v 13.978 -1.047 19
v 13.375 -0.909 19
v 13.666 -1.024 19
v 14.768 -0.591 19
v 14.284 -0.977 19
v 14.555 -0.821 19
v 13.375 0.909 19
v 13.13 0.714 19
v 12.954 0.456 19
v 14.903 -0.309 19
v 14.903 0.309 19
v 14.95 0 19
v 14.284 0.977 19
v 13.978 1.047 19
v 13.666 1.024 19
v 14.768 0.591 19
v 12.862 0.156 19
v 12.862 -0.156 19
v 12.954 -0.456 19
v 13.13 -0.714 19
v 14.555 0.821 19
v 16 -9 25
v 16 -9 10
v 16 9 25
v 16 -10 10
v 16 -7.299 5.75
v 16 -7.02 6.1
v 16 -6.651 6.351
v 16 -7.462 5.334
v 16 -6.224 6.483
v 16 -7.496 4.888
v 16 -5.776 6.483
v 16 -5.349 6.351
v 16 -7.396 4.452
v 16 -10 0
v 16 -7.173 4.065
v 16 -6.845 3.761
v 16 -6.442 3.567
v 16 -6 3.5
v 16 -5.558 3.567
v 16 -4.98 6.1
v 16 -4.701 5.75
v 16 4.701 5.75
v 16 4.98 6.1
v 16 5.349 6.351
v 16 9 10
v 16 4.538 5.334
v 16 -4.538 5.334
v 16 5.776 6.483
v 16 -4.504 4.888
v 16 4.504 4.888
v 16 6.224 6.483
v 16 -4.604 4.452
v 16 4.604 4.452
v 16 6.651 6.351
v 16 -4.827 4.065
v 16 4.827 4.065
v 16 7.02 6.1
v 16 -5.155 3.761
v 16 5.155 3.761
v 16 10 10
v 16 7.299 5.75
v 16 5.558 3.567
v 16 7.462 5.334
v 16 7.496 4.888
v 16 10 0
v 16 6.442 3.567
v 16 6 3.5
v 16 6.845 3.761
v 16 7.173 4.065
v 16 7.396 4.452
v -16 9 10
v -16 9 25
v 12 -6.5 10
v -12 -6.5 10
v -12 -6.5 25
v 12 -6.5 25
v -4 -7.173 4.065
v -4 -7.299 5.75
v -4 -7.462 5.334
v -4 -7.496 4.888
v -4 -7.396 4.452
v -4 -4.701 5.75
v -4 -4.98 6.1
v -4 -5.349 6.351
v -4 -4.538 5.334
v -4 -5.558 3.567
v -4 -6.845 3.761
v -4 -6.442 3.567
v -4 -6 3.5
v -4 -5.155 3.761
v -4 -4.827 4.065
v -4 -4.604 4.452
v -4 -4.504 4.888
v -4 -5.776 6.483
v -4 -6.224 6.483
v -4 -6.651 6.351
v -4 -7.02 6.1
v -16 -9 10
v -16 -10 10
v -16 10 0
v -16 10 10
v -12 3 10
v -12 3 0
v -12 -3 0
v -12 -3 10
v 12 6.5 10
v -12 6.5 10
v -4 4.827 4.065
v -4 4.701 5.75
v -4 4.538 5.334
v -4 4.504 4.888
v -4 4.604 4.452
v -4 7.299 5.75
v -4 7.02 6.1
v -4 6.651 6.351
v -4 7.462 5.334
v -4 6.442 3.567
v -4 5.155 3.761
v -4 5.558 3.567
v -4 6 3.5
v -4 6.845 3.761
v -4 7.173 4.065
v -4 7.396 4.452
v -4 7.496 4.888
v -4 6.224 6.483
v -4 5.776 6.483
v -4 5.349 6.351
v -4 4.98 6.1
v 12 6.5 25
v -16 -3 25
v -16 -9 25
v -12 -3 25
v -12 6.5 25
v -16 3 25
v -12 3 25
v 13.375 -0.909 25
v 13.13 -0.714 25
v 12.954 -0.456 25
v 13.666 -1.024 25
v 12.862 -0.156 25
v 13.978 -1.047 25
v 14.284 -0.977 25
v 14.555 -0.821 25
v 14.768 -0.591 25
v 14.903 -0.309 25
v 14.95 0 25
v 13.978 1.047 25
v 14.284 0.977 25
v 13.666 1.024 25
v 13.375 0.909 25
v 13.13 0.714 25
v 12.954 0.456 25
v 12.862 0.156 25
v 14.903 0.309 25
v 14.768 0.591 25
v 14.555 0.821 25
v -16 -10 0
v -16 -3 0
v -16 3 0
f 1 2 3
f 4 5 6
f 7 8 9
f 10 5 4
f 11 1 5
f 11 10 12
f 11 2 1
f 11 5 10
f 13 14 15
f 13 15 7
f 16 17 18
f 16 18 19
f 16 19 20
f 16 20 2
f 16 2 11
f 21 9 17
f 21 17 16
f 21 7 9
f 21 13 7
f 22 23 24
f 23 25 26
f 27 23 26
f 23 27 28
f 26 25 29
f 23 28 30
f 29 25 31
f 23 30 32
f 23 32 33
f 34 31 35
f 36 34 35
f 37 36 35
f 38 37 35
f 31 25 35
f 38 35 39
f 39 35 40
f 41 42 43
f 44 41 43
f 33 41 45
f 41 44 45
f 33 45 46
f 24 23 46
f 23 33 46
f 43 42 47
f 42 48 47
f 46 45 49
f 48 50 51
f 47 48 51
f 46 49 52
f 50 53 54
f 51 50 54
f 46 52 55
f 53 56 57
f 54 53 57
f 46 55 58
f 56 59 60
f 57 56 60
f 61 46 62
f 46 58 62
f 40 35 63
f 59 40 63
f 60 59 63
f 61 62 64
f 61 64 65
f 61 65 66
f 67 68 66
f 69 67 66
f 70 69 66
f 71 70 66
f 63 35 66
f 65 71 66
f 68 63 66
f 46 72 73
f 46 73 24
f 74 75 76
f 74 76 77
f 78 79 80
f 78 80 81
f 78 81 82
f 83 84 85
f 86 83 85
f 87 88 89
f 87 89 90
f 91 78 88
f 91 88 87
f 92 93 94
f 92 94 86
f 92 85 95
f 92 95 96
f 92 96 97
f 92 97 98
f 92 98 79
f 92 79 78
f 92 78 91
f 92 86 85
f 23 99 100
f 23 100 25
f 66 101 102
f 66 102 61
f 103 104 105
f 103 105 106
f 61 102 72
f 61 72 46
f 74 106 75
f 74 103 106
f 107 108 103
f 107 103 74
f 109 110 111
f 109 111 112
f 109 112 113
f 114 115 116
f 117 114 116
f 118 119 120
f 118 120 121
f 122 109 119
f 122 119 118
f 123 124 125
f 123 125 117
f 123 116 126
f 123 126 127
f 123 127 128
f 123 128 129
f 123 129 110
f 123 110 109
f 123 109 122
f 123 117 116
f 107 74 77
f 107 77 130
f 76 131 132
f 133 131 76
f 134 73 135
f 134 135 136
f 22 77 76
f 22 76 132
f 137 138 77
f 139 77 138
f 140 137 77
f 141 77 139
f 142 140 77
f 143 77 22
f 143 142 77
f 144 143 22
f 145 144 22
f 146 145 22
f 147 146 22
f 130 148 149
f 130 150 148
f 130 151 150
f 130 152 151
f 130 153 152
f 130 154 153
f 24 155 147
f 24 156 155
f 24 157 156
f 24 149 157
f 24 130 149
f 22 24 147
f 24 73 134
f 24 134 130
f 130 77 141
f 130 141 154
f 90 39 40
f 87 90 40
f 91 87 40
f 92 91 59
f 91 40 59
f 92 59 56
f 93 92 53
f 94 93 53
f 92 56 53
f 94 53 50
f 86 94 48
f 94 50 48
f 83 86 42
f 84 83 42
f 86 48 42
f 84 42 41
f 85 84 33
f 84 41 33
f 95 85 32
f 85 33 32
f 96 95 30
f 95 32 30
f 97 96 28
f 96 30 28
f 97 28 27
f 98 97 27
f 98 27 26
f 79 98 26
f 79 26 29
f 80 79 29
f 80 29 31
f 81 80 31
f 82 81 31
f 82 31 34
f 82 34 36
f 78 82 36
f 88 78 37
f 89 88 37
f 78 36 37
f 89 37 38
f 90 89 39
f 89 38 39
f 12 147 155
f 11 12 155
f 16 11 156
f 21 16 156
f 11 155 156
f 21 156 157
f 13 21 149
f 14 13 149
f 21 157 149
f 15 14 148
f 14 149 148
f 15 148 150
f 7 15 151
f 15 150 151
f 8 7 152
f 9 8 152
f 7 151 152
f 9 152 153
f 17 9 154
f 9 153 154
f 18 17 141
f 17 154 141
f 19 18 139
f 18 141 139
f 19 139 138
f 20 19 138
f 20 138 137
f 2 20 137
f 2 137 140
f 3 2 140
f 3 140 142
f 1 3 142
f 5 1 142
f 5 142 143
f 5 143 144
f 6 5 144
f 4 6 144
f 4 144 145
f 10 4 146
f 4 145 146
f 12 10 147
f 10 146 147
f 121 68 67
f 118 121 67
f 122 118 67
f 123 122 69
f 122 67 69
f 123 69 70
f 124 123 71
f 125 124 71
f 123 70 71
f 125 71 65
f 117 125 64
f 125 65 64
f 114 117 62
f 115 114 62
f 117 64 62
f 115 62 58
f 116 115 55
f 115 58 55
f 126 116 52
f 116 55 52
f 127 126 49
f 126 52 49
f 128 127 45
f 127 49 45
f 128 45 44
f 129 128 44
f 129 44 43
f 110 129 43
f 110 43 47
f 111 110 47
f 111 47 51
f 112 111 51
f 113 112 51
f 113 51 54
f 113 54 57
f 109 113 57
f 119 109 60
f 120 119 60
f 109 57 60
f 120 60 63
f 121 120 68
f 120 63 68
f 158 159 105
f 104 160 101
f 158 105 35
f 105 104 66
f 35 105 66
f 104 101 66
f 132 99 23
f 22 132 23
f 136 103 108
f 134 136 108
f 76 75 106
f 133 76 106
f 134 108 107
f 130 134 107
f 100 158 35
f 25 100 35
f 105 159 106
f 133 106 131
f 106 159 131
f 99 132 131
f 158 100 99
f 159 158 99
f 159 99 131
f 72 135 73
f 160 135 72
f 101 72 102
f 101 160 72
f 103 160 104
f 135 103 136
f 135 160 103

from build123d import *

# Parameters (mm, degrees)
ESQUISSE15_W             = 32
ESQUISSE15_H             = 20
BOSS_EXTRU_1_DEPTH       = 10
ESQUISSE16_W             = 32
ESQUISSE16_H             = 18
ESQUISSE16_W_2           = 24
ESQUISSE16_H_2           = 13
BOSS_EXTRU_2_DEPTH       = 15
ESQUISSE17_W             = 25
ESQUISSE17_H             = 6
ENL_V_MAT_EXTRU_8_DEPTH  = 4
ESQUISSE19_R             = 1.05
ENL_V_MAT_EXTRU_10_DEPTH = 6
ESQUISSE20_R             = 1.5
ENL_V_MAT_EXTRU_11_DEPTH = 20


with BuildPart() as part:
    # Esquisse15 → Boss.-Extru.1 (new body)
    with BuildSketch(Plane.XY):
        Rectangle(ESQUISSE15_W, ESQUISSE15_H)
    extrude(amount=BOSS_EXTRU_1_DEPTH)

    # Esquisse16 → Boss.-Extru.2 (add)
    with BuildSketch(Plane.XY.offset(10)):
        Rectangle(ESQUISSE16_W, ESQUISSE16_H)
        Rectangle(ESQUISSE16_W_2, ESQUISSE16_H_2, mode=Mode.SUBTRACT)
    extrude(amount=BOSS_EXTRU_2_DEPTH)

    # Esquisse17 → Enlèv. mat.-Extru.8 (cut)
    with BuildSketch(Plane.ZY.offset(16)):
        with Locations((12.5, 0)):
            Rectangle(ESQUISSE17_W, ESQUISSE17_H)
    extrude(amount=-ENL_V_MAT_EXTRU_8_DEPTH, mode=Mode.SUBTRACT)

    # Esquisse19 → Enlèv. mat.-Extru.10 (cut)
    with BuildSketch(Plane.XY.offset(25)):
        with Locations((13.9, 0)):
            Circle(ESQUISSE19_R)
    extrude(amount=-ENL_V_MAT_EXTRU_10_DEPTH, mode=Mode.SUBTRACT)

    # Esquisse20 → Enlèv. mat.-Extru.11 (cut)
    with BuildSketch(Plane(origin=(16, 0, 0), x_dir=(0, 0, -1), z_dir=(1, 0, 0))):
        with Locations((-5, 6)):
            Circle(ESQUISSE20_R)
        with Locations((-5, -6)):
            Circle(ESQUISSE20_R)
    extrude(amount=-ENL_V_MAT_EXTRU_11_DEPTH, mode=Mode.SUBTRACT)


solid = part.part
